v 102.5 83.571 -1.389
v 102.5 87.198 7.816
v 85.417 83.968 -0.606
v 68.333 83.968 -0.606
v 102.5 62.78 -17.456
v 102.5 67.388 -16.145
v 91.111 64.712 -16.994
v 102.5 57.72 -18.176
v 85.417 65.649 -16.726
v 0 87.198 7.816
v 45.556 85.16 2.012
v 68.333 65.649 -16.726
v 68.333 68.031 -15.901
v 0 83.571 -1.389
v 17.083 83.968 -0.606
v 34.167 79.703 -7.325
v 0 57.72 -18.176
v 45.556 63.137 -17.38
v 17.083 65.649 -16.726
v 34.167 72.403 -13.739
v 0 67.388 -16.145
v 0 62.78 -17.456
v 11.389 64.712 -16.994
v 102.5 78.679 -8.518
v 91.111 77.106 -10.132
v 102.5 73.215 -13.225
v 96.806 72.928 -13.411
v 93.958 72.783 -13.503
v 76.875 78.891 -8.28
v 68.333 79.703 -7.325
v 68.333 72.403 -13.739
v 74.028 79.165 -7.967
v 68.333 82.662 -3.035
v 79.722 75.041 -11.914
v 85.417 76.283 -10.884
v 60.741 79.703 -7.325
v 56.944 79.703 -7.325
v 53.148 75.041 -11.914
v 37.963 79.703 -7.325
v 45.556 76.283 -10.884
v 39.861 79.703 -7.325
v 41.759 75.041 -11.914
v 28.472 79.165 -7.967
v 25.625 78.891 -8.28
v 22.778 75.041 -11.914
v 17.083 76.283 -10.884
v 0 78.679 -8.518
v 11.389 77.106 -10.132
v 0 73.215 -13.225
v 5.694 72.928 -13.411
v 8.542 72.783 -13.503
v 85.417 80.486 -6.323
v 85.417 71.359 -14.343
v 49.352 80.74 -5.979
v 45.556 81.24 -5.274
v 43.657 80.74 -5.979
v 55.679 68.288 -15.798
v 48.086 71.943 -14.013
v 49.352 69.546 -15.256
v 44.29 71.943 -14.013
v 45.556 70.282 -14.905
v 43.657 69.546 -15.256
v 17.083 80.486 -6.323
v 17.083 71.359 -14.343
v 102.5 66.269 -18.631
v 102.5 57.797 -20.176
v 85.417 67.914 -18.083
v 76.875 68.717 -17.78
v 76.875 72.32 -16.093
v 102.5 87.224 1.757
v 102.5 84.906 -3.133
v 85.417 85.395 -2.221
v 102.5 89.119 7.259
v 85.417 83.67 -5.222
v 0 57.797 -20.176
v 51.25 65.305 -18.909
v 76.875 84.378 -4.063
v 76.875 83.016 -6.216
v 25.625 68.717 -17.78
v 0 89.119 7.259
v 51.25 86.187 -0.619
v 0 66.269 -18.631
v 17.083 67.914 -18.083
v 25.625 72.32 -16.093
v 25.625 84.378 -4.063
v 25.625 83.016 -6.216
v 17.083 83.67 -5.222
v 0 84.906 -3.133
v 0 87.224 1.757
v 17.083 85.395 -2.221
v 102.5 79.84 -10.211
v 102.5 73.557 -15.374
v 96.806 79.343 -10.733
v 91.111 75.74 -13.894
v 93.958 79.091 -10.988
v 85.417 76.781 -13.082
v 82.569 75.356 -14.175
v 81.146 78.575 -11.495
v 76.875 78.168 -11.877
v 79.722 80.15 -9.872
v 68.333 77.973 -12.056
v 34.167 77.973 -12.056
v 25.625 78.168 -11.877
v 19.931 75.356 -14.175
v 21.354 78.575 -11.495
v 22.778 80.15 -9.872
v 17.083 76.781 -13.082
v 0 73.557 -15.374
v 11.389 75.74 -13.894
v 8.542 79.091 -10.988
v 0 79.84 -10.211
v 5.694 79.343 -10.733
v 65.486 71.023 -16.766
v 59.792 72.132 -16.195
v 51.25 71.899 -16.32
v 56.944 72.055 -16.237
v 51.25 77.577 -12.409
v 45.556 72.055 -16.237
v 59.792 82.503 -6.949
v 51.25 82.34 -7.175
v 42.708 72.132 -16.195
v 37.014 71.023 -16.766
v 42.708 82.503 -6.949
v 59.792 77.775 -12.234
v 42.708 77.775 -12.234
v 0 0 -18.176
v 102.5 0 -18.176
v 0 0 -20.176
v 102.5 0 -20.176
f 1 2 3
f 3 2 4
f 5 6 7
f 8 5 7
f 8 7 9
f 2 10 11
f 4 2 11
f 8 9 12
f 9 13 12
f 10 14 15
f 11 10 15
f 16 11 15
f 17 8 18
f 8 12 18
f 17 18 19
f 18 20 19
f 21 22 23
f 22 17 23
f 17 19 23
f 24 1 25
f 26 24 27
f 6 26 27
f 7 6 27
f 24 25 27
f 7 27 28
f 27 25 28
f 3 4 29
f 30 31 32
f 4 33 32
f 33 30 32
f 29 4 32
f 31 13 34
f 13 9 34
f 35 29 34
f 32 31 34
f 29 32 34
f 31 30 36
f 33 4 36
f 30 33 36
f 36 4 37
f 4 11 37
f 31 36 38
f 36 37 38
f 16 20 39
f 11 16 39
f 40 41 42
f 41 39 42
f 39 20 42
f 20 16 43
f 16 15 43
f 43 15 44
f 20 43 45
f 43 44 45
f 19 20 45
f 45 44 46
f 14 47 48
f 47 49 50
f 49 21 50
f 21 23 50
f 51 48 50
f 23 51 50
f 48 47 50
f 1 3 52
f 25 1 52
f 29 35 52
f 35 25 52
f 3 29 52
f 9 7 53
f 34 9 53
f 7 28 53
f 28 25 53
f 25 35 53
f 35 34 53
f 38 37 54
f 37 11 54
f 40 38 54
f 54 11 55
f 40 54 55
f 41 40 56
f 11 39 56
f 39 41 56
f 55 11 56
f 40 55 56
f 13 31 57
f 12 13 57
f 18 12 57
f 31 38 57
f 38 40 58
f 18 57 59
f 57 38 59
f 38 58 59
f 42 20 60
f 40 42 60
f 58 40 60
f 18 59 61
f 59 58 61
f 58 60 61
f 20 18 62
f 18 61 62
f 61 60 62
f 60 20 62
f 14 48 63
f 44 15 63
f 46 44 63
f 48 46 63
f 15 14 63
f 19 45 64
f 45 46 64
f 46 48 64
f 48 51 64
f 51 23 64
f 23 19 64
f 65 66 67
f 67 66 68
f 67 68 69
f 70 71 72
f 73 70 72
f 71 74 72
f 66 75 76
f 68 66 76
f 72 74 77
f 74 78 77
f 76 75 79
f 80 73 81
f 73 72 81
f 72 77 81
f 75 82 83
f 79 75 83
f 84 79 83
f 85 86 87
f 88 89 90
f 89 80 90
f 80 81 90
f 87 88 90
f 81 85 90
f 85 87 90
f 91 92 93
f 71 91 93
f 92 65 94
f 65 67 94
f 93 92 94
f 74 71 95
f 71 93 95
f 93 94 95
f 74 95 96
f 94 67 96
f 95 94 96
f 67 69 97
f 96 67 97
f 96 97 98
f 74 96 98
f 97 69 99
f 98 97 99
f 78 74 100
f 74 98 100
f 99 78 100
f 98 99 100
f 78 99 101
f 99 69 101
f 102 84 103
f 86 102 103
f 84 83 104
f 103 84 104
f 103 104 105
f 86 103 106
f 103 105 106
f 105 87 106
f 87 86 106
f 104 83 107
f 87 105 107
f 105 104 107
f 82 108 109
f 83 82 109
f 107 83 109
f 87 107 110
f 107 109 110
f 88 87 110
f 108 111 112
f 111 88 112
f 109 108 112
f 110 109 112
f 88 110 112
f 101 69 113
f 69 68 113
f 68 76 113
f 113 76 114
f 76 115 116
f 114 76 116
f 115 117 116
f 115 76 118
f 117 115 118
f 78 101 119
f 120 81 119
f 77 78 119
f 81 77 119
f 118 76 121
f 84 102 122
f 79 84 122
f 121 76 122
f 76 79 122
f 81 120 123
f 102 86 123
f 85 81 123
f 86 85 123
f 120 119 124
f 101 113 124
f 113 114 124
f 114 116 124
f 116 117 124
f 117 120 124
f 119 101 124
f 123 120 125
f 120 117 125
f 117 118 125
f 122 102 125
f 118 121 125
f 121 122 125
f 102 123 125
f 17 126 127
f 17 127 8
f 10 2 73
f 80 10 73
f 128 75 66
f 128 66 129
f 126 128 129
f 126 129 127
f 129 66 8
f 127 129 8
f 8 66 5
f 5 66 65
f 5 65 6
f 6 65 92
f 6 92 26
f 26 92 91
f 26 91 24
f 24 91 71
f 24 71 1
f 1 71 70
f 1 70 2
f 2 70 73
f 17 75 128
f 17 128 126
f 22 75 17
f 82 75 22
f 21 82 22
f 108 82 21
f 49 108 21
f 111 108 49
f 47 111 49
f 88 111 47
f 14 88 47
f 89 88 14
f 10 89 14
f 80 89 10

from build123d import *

# Parameters (mm, degrees)
BOSS_EXTRU_1_DEPTH = 102.5


with BuildPart() as part:
    # Esquisse2 → Boss.-Extru.1 (new body)
    with BuildSketch(Plane(origin=(0, 0, 0), x_dir=(0, 0, -1), z_dir=(1, 0, 0))):
        with BuildLine():
            Line((20.175844181, 57.796560731), (20.175844181, 0))
            Line((20.175844181, 0), (18.175844181, 0))
            Line((18.175844181, 0), (18.175844181, 57.719847418))
            add(Edge.make_bspline(
                [(-7.816037555, 87.197675328), (1.458199142, 84.486674845), (11.235554116, 76.513419425), (17.493683513, 66.237213452), (18.175844181, 57.719847418)],
                knots=[0.581934289, 0.581934289, 0.581934289, 0.73870893, 0.843225358, 1, 1, 1], degree=2))
            Line((-7.816037555, 87.197675328), (-7.259494569, 89.118680248))
            add(Edge.make_bspline(
                [(20.175844181, 57.796560731), (18.360004181, 81.6963399), (-7.259494569, 89.118680248)],
                knots=[0.58124873, 0.58124873, 0.58124873, 1, 1, 1], degree=2))
        make_face()
    extrude(amount=BOSS_EXTRU_1_DEPTH)


solid = part.part
